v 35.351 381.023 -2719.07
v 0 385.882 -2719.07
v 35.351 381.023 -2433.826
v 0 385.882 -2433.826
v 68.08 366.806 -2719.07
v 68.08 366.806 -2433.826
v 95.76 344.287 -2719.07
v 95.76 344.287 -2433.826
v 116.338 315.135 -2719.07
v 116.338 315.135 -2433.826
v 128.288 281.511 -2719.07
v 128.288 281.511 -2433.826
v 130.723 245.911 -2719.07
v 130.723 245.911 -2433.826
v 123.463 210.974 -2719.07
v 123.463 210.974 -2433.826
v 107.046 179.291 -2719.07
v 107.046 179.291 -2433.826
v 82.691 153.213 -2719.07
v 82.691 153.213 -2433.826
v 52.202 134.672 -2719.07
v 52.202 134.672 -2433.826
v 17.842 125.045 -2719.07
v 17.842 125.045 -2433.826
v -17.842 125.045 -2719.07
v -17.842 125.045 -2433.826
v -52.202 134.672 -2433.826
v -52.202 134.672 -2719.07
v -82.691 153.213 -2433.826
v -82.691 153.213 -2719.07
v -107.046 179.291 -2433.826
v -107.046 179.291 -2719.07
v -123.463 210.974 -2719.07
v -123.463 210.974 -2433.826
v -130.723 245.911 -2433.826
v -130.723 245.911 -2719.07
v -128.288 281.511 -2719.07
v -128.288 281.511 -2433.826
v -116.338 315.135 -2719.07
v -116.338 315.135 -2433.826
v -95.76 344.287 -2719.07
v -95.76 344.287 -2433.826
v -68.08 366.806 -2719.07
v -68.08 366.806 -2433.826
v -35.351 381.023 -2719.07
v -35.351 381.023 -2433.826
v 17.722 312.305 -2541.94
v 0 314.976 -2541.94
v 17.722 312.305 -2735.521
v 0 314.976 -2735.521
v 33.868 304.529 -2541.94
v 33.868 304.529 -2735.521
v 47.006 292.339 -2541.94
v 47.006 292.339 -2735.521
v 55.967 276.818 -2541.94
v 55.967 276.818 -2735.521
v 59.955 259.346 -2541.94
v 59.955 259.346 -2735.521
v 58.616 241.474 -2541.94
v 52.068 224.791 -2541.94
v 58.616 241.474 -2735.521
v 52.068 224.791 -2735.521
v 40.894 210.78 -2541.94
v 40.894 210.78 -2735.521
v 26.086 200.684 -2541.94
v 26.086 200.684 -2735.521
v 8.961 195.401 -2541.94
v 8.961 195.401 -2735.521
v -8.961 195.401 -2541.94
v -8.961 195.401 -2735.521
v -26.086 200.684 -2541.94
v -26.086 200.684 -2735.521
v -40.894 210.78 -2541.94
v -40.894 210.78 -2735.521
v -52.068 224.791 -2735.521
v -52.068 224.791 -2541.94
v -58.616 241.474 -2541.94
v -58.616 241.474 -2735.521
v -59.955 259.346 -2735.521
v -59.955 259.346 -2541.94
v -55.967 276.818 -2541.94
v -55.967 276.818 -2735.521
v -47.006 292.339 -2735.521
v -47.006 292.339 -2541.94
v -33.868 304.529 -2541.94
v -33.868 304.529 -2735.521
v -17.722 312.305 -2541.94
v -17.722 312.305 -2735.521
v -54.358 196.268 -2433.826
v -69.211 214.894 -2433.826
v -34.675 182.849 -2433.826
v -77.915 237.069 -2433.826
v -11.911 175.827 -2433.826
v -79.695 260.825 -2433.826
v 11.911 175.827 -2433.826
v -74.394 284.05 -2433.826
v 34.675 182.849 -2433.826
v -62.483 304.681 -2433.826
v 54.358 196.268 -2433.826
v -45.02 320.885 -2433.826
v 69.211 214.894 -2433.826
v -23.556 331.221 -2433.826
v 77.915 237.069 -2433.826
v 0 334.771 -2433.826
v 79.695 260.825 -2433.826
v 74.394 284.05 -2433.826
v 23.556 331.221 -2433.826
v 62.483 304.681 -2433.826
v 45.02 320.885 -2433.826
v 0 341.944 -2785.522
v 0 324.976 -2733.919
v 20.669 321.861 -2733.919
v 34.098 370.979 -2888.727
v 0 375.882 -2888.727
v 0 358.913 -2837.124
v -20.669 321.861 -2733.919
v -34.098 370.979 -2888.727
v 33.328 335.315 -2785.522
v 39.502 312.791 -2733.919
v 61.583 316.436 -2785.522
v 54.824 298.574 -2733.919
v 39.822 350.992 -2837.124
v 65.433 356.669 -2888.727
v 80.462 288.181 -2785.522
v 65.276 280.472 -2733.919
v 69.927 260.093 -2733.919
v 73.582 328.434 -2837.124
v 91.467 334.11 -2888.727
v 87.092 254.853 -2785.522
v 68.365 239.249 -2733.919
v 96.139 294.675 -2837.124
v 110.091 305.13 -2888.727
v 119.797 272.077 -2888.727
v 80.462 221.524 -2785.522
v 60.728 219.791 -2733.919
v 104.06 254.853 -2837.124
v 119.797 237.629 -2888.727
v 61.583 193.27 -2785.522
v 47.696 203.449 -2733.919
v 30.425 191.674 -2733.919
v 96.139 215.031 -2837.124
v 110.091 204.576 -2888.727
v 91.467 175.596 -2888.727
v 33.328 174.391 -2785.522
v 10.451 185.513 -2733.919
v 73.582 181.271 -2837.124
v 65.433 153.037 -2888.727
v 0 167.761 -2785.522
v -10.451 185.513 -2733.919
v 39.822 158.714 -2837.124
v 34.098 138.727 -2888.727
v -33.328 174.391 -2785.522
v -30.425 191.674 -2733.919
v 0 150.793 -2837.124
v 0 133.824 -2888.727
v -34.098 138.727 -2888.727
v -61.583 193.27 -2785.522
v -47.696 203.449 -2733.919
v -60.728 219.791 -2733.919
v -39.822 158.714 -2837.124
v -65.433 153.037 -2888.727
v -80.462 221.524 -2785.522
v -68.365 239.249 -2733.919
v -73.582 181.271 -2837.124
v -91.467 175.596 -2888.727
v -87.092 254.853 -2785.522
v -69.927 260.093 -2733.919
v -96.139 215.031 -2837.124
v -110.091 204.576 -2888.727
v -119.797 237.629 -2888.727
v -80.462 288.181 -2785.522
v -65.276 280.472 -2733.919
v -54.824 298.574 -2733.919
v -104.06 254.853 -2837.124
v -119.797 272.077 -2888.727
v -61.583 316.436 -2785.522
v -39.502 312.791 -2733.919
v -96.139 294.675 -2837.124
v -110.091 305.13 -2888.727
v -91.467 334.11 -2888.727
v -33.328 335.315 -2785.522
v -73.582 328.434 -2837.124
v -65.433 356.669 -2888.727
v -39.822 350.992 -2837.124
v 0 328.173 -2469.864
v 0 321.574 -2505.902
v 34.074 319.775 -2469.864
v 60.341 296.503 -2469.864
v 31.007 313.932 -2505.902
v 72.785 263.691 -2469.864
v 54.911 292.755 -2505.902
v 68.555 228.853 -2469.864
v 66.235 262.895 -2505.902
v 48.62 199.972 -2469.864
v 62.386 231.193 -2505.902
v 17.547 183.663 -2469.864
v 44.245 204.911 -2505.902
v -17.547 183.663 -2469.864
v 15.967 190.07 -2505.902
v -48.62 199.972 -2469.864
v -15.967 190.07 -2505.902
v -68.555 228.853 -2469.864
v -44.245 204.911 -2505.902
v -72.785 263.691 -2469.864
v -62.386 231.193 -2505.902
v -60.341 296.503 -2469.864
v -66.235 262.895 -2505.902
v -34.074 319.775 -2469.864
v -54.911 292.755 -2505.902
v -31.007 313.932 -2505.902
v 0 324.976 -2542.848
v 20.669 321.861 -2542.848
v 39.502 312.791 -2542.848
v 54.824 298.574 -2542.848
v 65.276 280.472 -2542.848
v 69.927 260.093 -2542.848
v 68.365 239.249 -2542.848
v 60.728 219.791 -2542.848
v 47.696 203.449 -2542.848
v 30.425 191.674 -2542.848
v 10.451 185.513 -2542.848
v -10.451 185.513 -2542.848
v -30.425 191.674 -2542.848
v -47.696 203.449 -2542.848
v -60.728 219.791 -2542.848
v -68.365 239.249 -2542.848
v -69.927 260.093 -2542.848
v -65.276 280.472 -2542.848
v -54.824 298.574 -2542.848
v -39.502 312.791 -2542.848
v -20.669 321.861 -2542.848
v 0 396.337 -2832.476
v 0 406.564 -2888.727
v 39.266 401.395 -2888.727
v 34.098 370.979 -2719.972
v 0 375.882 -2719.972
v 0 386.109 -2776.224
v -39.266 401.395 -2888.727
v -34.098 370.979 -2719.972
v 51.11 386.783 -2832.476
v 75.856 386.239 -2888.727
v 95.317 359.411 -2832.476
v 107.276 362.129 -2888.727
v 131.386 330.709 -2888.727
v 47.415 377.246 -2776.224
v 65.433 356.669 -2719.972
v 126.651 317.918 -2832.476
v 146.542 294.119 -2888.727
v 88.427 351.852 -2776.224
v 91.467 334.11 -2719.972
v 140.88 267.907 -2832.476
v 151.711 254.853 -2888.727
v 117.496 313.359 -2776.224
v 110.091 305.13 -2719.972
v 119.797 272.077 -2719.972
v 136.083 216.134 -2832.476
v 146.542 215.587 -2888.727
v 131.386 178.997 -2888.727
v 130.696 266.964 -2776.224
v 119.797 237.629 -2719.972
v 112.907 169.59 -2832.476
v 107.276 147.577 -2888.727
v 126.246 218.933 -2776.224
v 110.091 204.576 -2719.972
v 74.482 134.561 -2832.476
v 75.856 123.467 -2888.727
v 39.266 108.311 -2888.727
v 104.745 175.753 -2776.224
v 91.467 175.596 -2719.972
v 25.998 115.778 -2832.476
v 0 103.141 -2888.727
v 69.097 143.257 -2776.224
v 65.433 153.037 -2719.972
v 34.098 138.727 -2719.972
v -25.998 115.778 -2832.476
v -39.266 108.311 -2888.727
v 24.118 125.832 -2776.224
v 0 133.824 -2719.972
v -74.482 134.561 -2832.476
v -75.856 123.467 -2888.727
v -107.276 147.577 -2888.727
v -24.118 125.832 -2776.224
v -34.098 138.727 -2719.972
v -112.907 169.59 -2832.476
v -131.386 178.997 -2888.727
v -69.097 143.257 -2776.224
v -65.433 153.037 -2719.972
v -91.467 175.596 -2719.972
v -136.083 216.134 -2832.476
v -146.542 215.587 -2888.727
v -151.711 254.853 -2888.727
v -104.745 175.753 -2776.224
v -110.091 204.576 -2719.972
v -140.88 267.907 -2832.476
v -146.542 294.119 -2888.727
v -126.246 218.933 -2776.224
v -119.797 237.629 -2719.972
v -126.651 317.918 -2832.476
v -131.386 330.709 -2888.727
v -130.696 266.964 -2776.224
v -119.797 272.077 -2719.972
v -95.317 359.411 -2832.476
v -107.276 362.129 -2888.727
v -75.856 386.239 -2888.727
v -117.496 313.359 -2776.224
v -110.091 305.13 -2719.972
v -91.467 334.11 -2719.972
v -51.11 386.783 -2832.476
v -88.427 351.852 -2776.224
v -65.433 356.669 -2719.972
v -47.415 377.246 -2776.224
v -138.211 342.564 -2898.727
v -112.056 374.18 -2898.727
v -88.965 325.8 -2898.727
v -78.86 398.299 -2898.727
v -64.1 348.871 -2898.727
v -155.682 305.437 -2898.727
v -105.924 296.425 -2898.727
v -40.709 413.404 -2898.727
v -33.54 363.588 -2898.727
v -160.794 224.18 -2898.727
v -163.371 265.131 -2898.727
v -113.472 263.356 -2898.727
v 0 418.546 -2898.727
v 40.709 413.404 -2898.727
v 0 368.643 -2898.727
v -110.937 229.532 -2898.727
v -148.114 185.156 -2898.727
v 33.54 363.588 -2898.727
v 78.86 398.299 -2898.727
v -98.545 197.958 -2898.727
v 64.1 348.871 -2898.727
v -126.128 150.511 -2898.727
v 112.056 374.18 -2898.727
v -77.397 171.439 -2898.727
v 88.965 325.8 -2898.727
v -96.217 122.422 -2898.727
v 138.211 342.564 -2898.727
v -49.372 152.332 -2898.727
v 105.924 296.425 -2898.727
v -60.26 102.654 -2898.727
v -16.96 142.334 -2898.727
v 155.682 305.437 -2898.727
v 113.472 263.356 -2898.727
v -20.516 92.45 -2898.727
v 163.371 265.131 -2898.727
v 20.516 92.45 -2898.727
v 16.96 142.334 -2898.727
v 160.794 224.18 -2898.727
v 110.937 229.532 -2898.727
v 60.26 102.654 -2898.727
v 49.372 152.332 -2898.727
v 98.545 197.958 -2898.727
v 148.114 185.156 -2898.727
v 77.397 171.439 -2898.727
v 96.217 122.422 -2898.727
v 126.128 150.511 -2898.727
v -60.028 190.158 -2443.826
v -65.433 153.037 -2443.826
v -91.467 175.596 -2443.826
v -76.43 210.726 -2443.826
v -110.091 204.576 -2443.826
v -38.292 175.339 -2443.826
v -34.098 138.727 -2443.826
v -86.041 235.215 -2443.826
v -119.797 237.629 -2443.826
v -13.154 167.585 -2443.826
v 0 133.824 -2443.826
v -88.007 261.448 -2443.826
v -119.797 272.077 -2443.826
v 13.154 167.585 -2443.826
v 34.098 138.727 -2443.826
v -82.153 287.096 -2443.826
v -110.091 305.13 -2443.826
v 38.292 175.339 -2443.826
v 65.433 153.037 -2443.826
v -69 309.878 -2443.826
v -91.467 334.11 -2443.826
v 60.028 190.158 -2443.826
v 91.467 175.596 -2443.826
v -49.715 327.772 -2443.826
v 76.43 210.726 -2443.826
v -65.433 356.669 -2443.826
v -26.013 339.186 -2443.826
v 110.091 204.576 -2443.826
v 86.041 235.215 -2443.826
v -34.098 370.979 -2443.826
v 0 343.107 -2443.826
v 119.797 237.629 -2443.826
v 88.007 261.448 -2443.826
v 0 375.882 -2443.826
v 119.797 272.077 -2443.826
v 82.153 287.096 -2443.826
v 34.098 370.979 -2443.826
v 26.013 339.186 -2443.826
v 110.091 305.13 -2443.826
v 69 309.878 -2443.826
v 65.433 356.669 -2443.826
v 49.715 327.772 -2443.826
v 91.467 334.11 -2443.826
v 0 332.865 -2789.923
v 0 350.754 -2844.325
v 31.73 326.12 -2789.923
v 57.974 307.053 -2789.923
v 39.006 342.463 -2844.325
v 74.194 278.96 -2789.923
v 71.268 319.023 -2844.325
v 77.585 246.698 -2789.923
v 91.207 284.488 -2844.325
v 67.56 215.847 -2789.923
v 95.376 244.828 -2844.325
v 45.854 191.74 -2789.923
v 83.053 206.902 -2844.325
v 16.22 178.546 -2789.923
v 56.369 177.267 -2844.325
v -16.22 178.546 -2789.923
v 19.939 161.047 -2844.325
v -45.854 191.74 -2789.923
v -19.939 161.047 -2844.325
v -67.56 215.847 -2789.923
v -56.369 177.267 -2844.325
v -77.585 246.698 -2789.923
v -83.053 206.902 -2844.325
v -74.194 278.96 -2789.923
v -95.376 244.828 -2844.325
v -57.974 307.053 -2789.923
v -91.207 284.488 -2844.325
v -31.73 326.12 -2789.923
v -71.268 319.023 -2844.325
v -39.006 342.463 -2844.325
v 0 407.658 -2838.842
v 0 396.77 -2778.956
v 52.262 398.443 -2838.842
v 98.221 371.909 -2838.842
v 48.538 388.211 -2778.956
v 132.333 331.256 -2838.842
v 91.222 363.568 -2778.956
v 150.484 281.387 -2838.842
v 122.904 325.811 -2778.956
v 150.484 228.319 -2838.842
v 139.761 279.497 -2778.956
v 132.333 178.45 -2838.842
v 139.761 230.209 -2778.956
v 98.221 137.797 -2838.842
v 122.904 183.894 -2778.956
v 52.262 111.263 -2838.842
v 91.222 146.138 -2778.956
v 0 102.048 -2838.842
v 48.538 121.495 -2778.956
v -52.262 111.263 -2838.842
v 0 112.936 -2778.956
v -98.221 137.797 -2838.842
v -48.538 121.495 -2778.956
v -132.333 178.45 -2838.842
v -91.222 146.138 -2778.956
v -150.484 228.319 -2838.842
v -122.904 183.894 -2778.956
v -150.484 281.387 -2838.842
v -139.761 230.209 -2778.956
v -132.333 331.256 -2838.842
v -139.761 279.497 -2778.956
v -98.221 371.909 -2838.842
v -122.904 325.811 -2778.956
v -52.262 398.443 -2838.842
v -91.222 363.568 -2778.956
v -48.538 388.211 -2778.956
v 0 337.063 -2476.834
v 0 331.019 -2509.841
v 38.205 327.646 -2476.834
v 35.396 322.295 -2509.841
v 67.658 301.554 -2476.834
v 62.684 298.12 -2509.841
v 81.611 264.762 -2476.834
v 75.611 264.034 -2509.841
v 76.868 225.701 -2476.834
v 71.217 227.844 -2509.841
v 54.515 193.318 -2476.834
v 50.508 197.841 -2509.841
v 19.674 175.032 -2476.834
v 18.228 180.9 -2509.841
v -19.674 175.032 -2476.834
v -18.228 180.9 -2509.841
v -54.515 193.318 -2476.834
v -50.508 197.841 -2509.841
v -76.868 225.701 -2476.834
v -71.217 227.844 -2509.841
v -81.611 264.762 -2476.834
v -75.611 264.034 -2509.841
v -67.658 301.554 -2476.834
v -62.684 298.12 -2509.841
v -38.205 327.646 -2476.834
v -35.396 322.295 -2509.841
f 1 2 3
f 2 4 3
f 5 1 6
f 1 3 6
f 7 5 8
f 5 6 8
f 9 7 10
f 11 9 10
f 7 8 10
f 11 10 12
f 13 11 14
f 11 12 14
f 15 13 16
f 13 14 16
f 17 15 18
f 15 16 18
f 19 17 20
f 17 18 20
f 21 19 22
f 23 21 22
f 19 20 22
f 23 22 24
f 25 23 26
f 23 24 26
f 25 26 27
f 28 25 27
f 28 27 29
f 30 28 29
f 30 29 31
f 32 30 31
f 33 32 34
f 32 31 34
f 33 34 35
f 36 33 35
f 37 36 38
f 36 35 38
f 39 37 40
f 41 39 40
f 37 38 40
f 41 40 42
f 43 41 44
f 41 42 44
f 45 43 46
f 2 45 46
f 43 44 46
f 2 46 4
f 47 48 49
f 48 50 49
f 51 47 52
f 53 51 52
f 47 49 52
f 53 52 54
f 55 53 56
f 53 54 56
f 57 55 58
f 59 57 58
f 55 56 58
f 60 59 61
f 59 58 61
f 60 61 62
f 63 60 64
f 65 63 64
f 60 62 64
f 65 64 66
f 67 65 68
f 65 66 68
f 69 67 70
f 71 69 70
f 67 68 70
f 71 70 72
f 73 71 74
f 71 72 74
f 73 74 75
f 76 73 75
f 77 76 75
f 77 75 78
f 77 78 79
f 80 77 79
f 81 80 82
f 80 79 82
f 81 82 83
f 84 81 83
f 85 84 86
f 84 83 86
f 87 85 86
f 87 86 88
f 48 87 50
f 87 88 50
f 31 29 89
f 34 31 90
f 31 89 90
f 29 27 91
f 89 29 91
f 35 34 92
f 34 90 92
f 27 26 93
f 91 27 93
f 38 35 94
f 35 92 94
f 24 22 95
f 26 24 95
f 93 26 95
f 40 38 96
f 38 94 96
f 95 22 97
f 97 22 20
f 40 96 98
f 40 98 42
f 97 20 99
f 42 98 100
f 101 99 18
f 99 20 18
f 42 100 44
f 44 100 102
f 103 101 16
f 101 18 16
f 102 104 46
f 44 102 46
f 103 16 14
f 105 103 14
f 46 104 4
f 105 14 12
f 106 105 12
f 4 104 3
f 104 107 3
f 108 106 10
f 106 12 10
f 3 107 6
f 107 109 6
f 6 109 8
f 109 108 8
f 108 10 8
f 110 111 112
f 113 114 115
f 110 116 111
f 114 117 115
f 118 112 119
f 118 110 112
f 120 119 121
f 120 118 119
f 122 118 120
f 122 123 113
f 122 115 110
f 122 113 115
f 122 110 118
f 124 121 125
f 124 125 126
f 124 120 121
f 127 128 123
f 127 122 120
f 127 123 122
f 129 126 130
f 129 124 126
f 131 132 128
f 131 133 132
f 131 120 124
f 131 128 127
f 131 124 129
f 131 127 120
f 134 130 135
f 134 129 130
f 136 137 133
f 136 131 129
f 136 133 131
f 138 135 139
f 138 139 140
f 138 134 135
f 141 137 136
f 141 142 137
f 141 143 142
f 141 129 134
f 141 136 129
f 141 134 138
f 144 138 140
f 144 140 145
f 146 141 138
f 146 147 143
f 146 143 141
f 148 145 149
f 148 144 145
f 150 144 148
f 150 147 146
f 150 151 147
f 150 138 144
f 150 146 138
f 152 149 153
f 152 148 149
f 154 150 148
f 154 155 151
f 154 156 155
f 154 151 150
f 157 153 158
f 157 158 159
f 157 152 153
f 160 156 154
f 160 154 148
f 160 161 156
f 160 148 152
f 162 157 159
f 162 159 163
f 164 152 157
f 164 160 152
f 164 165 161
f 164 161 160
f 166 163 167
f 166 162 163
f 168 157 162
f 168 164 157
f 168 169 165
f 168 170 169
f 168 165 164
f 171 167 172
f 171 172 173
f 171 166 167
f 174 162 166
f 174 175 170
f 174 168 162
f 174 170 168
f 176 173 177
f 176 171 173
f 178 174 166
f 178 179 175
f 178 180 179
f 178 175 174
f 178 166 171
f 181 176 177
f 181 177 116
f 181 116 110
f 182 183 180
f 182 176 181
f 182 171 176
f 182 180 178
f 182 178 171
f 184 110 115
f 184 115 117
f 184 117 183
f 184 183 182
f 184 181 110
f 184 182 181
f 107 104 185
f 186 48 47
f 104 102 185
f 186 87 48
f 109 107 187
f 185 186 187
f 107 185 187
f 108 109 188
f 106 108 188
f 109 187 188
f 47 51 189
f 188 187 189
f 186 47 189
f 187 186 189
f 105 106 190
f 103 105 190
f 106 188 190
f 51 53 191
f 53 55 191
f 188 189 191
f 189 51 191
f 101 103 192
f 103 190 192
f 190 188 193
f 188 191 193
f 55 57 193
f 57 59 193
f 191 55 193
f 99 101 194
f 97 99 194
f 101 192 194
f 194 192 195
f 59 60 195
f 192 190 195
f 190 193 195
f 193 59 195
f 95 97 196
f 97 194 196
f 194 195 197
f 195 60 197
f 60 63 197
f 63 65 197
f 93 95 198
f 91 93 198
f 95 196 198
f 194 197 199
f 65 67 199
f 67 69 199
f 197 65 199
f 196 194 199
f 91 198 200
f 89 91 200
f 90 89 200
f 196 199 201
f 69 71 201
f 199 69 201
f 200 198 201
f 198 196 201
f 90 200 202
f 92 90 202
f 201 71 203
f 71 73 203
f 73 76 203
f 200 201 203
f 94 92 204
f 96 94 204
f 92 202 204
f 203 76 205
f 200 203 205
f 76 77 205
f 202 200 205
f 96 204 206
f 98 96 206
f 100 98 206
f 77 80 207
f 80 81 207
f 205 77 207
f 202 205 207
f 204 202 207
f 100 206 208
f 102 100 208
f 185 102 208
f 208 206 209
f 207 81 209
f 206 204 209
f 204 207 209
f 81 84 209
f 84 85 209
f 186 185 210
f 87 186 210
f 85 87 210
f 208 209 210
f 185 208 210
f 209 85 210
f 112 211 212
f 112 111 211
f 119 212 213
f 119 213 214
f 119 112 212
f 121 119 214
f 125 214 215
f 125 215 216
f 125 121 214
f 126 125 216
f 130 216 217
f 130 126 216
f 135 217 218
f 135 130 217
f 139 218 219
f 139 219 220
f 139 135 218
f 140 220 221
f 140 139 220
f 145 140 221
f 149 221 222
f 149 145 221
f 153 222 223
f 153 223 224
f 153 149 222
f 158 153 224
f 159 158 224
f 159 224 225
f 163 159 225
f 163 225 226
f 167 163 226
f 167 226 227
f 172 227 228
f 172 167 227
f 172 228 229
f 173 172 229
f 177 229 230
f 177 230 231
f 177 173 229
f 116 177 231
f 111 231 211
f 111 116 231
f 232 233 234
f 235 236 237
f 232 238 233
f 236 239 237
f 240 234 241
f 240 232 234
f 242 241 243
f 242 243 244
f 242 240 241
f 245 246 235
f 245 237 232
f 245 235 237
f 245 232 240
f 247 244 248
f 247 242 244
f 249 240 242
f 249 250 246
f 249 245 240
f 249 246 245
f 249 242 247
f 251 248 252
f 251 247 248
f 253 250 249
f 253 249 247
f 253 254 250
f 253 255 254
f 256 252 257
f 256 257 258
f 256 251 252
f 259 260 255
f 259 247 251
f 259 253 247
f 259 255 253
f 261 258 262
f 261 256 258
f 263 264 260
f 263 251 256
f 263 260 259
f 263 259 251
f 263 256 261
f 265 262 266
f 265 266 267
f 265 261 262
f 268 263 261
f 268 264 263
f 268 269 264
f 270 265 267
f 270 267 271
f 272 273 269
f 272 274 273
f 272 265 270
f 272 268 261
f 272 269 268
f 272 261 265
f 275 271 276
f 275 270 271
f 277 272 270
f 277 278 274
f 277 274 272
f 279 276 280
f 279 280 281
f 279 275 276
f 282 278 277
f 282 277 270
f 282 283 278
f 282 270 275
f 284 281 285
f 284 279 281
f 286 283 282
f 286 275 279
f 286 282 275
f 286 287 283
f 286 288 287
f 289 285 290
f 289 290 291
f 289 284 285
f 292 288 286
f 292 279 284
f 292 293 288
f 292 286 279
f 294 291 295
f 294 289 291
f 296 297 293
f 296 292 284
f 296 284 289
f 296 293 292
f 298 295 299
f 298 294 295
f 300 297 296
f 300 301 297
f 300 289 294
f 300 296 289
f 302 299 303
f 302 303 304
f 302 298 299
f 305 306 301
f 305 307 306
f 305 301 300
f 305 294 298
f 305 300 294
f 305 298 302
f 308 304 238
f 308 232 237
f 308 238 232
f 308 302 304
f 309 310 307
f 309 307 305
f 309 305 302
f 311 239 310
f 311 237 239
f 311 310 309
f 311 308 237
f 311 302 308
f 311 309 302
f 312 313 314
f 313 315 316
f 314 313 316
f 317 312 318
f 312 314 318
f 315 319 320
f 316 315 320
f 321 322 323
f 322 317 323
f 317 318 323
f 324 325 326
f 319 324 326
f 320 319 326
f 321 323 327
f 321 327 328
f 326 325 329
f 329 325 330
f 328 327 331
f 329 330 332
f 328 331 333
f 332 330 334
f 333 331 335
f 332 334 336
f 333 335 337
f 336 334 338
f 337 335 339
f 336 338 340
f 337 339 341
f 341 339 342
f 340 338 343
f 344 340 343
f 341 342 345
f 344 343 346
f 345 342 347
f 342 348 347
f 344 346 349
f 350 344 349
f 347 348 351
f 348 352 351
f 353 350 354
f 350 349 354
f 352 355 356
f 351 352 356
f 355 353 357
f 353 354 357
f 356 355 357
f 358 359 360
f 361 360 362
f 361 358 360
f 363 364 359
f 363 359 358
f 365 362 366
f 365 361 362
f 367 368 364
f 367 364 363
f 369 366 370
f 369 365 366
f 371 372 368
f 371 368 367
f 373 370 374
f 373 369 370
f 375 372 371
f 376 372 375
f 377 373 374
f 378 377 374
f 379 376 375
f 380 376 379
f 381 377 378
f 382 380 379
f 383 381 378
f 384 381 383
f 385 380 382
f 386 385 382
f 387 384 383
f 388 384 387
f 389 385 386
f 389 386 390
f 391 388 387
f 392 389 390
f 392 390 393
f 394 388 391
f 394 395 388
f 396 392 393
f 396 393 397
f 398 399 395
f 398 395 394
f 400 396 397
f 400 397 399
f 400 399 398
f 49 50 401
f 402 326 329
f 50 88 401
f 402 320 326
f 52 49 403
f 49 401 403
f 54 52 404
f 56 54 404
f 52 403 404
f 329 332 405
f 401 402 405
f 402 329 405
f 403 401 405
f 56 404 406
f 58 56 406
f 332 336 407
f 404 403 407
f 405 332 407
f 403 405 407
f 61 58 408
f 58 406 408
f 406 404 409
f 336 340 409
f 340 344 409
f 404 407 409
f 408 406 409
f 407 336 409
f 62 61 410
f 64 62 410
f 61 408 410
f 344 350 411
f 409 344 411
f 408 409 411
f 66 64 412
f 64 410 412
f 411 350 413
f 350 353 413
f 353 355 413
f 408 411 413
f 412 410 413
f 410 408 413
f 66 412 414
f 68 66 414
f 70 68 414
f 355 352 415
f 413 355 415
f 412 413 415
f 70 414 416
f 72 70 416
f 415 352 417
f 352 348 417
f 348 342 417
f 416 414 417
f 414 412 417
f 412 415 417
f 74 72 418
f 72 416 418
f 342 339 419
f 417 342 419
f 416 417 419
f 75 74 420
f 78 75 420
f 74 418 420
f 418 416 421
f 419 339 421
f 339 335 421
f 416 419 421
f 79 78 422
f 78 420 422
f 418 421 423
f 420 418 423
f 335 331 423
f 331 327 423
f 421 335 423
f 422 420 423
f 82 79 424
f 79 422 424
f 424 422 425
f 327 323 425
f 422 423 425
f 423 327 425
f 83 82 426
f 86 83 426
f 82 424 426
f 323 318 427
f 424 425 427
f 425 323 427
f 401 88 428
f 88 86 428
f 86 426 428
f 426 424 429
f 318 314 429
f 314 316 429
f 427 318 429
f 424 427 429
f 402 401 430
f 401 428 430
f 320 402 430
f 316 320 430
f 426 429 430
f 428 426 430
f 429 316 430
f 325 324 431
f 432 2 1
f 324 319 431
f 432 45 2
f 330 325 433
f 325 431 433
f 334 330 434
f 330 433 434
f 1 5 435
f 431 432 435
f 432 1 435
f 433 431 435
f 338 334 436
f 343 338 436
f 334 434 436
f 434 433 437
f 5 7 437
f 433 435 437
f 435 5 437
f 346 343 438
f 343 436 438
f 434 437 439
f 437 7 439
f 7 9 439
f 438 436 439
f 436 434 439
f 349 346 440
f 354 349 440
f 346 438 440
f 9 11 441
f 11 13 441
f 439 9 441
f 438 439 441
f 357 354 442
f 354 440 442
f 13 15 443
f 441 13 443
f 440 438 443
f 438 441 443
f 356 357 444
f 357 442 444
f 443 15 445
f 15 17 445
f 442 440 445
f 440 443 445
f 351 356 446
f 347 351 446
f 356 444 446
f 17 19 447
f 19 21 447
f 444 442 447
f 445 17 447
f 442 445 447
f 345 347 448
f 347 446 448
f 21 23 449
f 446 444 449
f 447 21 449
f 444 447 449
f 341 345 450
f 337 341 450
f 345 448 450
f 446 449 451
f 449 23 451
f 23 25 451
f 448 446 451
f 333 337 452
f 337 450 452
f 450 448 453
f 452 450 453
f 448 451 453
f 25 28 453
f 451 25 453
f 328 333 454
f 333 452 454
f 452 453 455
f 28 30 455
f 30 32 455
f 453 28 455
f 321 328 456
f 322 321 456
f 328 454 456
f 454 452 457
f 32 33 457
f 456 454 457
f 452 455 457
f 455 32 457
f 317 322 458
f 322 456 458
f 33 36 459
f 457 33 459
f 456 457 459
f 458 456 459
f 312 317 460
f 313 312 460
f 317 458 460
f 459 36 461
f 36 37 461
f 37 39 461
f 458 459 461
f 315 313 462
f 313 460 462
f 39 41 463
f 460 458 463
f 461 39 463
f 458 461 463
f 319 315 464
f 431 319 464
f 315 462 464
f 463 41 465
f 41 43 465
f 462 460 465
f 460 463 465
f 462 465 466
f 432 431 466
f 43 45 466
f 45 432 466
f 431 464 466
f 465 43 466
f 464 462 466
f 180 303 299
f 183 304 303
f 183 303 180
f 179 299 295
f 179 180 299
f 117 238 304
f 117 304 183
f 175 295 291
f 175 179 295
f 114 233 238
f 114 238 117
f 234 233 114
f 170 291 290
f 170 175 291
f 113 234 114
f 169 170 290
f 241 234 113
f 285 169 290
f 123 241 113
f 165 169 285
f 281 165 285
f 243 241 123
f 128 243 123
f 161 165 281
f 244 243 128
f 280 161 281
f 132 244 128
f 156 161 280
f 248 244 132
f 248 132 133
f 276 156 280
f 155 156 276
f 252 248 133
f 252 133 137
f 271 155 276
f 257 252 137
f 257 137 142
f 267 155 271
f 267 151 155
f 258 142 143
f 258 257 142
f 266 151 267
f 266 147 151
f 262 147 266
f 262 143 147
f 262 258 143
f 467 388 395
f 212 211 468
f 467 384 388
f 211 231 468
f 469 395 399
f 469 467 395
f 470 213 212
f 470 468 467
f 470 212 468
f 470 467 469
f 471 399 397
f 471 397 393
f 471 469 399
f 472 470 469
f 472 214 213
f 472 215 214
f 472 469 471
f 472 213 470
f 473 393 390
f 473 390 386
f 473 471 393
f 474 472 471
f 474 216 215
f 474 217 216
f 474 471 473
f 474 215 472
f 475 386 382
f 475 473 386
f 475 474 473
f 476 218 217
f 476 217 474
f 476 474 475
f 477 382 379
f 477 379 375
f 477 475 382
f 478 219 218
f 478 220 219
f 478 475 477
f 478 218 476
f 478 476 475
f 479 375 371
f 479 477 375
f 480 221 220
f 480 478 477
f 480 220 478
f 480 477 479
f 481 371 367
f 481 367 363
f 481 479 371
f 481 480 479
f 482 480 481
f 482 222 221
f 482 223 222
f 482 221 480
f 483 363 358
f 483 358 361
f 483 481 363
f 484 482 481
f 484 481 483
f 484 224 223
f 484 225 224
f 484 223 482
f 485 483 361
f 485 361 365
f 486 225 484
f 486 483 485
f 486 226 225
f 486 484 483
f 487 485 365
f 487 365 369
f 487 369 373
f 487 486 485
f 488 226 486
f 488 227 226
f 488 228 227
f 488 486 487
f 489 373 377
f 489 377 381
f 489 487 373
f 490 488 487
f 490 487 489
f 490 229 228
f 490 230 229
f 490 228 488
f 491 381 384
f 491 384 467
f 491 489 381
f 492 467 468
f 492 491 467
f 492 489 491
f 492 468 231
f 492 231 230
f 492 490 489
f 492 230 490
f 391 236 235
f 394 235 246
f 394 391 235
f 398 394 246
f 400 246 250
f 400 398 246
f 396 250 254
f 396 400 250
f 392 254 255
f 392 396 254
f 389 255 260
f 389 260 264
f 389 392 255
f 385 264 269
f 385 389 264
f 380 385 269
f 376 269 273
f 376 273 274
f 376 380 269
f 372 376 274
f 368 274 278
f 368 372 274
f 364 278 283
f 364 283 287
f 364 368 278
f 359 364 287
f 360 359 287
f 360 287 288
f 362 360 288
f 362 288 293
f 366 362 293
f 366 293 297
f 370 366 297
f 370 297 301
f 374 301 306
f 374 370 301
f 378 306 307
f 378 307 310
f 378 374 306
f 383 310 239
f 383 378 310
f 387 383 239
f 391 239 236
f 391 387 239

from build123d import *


with BuildPart() as part:
    # Sketch1 → Revolve-Thin1 (revolve)
    with BuildSketch(Plane(origin=(0, 0, 0), x_dir=(0, 0, -1), z_dir=(1, 0, 0))):
        Polygon((2433.826246914, 385.88150306), (2433.826246914, 334.771392049), (2541.94019818, 314.975879845), (2735.520516837, 314.975879845), (2898.727447068, 368.64302357), (2898.727447068, 418.546471621), (2719.070119986, 385.88150306), align=None)
        Polygon((2443.826246914, 375.88150306), (2443.826246914, 343.106649757), (2542.848144127, 324.975879845), (2733.918565509, 324.975879845), (2888.727447068, 375.88150306), (2888.727447068, 406.56434445), (2719.971819423, 375.88150306), align=None, mode=Mode.SUBTRACT)
    revolve(axis=Axis((0, 254.852892636, -1616.565391775), (0, 0, -1)))


solid = part.part
